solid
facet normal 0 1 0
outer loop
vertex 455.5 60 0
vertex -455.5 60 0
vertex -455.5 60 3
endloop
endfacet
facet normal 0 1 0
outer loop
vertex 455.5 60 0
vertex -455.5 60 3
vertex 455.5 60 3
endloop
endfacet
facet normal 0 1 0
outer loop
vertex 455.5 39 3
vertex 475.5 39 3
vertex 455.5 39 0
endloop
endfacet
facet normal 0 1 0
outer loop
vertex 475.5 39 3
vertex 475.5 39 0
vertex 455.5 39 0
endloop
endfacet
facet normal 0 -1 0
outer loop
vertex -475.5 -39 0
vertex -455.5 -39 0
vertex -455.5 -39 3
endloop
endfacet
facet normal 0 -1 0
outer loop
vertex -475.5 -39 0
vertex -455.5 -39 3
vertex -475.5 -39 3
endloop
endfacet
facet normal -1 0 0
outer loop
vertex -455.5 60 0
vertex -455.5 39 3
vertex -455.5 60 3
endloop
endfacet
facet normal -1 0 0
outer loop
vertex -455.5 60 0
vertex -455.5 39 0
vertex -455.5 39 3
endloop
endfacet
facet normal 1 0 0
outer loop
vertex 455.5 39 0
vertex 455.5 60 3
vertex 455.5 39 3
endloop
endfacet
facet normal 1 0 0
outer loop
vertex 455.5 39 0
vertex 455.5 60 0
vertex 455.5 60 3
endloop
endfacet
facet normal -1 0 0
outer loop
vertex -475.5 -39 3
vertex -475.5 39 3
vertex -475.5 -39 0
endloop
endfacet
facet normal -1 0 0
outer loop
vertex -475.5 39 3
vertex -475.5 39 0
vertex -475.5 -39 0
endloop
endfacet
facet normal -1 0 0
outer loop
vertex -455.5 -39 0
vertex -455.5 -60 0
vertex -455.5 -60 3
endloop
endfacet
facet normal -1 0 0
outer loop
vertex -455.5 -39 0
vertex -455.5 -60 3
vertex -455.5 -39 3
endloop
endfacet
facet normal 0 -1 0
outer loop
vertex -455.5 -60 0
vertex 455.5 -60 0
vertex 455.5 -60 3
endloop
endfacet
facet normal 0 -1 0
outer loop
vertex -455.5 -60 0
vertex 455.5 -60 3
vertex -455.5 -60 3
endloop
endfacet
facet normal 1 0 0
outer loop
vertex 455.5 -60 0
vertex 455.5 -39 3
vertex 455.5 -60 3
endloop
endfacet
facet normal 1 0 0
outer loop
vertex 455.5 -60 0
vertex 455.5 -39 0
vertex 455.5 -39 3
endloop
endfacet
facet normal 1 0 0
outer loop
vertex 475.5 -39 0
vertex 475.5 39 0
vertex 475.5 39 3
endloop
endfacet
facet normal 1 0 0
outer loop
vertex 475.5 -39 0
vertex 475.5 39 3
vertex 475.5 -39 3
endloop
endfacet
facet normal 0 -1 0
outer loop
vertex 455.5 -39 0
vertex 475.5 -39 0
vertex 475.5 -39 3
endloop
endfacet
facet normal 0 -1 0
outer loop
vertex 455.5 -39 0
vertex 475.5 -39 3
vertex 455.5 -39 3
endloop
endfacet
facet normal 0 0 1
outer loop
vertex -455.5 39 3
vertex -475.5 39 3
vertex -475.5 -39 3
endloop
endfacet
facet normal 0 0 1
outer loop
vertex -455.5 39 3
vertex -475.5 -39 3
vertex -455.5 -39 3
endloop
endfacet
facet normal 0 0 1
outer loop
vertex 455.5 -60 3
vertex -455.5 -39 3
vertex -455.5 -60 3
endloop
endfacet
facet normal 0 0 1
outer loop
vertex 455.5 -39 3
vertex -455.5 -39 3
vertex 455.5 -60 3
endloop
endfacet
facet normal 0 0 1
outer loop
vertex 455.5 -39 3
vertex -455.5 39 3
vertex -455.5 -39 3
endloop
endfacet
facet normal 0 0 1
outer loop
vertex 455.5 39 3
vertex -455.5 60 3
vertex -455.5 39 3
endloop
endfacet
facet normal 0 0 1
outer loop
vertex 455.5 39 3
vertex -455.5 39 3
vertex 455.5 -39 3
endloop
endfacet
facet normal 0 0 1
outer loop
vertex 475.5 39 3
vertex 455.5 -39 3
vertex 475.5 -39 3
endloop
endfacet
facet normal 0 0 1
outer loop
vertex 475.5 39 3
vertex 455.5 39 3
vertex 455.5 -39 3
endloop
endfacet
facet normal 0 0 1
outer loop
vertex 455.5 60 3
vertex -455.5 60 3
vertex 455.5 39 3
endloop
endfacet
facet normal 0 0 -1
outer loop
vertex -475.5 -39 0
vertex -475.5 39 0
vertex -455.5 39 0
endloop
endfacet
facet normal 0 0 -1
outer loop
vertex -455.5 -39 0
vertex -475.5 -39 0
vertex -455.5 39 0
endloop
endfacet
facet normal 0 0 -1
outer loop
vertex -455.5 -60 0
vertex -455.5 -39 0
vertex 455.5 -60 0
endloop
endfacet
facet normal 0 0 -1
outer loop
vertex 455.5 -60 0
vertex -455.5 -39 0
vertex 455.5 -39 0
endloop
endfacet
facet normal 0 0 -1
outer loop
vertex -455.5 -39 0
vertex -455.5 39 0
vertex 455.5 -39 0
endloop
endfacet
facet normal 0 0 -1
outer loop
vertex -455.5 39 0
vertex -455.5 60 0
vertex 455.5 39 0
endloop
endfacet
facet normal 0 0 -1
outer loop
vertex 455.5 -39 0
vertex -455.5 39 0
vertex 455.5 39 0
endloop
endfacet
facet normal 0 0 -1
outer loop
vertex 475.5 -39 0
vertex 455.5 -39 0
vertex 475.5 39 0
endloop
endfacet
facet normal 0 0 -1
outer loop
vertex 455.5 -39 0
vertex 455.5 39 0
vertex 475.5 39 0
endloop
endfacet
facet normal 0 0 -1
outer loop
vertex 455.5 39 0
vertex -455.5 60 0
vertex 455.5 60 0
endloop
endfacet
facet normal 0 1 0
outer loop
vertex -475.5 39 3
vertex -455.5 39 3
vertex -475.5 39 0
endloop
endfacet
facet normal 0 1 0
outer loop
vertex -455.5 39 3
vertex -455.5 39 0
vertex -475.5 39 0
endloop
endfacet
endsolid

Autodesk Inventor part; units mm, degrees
ref_plane "YZ Plane" through (0, 0, 0) normal (1, 0, 0) x (0, 1, 0)
ref_plane "XZ Plane" through (0, 0, 0) normal (0, 1, 0) x (-1, 0, 0)
ref_plane "XY Plane" through (0, 0, 0) normal (0, 0, 1) x (1, 0, 0)
sketch "草图1" plane through (0, 0, 0) normal (0, 0, 1) x (1, 0, 0)
  line L0 (477.5, -60) -> (-477.5, -60)
  line L1 (-477.5, -60) -> (-477.5, 60)
  line L2 (-477.5, 60) -> (477.5, 60)
  line L3 (477.5, 60) -> (477.5, -60)
  line L4 (477.5, -60) -> (-477.5, 60) construction
  line L5 (-477.5, -60) -> (477.5, 60) construction
  line L6 (477.5, -40) -> (-477.5, -40) projected
  line L7 (477.5, 40) -> (-477.5, 40) projected
  line L8 (-457.5, 40) -> (-457.5, -40)
  line L9 (457.5, 40) -> (457.5, -40) projected
  line L10 (-455.5, -60) -> (-455.5, 60)
  line L11 (477.5, -39) -> (-477.5, -39)
  line L12 (477.5, 39) -> (-477.5, 39)
  line L13 (-475.5, 59.7487) -> (-475.5, -60)
  line L14 (475.5, 60) -> (475.5, -60)
  line L15 (455.5, 60) -> (455.5, -60)
  point P0 (0, 0)
  point P1 (457.5, -60)
  point P2 (457.5, 60)
  point P3 (-455.5, 40)
  point P4 (-455.5, -40)
  point P5 (457.5, 39)
  point P6 (-457.5, 39)
  point P7 (-457.5, -39)
  point P8 (457.5, -39)
  point P9 (-475.5, 39)
  point P10 (-475.5, -39)
  point P11 (475.5, -39)
  point P12 (475.5, 39)
  point P13 (-455.5, -39)
  point P14 (-455.5, 39)
  point P15 (455.5, -39)
  point P16 (455.5, 39)
  dimension "d0" = 120
  dimension "d1" = 955
  dimension "d4" = 1
  dimension "d5" = 1
  dimension "d6" = 2
  dimension "d7" = 2
  dimension "d8" = 2
  dimension "d9" = 2
extrude "拉伸1" add sketch "草图1" along normal blind 3 contours L0 L10 L6 L15 | L6 L10 L11 L15 | L11 L9 L12 L14 | L15 L12 L9 L11 | L11 L10 L12 L15 | L11 L8 L12 L10 | L12 L10 L7 L15 | L13 L12 L8 L11 | L7 L10 L2 L15
properties part number "内板"
